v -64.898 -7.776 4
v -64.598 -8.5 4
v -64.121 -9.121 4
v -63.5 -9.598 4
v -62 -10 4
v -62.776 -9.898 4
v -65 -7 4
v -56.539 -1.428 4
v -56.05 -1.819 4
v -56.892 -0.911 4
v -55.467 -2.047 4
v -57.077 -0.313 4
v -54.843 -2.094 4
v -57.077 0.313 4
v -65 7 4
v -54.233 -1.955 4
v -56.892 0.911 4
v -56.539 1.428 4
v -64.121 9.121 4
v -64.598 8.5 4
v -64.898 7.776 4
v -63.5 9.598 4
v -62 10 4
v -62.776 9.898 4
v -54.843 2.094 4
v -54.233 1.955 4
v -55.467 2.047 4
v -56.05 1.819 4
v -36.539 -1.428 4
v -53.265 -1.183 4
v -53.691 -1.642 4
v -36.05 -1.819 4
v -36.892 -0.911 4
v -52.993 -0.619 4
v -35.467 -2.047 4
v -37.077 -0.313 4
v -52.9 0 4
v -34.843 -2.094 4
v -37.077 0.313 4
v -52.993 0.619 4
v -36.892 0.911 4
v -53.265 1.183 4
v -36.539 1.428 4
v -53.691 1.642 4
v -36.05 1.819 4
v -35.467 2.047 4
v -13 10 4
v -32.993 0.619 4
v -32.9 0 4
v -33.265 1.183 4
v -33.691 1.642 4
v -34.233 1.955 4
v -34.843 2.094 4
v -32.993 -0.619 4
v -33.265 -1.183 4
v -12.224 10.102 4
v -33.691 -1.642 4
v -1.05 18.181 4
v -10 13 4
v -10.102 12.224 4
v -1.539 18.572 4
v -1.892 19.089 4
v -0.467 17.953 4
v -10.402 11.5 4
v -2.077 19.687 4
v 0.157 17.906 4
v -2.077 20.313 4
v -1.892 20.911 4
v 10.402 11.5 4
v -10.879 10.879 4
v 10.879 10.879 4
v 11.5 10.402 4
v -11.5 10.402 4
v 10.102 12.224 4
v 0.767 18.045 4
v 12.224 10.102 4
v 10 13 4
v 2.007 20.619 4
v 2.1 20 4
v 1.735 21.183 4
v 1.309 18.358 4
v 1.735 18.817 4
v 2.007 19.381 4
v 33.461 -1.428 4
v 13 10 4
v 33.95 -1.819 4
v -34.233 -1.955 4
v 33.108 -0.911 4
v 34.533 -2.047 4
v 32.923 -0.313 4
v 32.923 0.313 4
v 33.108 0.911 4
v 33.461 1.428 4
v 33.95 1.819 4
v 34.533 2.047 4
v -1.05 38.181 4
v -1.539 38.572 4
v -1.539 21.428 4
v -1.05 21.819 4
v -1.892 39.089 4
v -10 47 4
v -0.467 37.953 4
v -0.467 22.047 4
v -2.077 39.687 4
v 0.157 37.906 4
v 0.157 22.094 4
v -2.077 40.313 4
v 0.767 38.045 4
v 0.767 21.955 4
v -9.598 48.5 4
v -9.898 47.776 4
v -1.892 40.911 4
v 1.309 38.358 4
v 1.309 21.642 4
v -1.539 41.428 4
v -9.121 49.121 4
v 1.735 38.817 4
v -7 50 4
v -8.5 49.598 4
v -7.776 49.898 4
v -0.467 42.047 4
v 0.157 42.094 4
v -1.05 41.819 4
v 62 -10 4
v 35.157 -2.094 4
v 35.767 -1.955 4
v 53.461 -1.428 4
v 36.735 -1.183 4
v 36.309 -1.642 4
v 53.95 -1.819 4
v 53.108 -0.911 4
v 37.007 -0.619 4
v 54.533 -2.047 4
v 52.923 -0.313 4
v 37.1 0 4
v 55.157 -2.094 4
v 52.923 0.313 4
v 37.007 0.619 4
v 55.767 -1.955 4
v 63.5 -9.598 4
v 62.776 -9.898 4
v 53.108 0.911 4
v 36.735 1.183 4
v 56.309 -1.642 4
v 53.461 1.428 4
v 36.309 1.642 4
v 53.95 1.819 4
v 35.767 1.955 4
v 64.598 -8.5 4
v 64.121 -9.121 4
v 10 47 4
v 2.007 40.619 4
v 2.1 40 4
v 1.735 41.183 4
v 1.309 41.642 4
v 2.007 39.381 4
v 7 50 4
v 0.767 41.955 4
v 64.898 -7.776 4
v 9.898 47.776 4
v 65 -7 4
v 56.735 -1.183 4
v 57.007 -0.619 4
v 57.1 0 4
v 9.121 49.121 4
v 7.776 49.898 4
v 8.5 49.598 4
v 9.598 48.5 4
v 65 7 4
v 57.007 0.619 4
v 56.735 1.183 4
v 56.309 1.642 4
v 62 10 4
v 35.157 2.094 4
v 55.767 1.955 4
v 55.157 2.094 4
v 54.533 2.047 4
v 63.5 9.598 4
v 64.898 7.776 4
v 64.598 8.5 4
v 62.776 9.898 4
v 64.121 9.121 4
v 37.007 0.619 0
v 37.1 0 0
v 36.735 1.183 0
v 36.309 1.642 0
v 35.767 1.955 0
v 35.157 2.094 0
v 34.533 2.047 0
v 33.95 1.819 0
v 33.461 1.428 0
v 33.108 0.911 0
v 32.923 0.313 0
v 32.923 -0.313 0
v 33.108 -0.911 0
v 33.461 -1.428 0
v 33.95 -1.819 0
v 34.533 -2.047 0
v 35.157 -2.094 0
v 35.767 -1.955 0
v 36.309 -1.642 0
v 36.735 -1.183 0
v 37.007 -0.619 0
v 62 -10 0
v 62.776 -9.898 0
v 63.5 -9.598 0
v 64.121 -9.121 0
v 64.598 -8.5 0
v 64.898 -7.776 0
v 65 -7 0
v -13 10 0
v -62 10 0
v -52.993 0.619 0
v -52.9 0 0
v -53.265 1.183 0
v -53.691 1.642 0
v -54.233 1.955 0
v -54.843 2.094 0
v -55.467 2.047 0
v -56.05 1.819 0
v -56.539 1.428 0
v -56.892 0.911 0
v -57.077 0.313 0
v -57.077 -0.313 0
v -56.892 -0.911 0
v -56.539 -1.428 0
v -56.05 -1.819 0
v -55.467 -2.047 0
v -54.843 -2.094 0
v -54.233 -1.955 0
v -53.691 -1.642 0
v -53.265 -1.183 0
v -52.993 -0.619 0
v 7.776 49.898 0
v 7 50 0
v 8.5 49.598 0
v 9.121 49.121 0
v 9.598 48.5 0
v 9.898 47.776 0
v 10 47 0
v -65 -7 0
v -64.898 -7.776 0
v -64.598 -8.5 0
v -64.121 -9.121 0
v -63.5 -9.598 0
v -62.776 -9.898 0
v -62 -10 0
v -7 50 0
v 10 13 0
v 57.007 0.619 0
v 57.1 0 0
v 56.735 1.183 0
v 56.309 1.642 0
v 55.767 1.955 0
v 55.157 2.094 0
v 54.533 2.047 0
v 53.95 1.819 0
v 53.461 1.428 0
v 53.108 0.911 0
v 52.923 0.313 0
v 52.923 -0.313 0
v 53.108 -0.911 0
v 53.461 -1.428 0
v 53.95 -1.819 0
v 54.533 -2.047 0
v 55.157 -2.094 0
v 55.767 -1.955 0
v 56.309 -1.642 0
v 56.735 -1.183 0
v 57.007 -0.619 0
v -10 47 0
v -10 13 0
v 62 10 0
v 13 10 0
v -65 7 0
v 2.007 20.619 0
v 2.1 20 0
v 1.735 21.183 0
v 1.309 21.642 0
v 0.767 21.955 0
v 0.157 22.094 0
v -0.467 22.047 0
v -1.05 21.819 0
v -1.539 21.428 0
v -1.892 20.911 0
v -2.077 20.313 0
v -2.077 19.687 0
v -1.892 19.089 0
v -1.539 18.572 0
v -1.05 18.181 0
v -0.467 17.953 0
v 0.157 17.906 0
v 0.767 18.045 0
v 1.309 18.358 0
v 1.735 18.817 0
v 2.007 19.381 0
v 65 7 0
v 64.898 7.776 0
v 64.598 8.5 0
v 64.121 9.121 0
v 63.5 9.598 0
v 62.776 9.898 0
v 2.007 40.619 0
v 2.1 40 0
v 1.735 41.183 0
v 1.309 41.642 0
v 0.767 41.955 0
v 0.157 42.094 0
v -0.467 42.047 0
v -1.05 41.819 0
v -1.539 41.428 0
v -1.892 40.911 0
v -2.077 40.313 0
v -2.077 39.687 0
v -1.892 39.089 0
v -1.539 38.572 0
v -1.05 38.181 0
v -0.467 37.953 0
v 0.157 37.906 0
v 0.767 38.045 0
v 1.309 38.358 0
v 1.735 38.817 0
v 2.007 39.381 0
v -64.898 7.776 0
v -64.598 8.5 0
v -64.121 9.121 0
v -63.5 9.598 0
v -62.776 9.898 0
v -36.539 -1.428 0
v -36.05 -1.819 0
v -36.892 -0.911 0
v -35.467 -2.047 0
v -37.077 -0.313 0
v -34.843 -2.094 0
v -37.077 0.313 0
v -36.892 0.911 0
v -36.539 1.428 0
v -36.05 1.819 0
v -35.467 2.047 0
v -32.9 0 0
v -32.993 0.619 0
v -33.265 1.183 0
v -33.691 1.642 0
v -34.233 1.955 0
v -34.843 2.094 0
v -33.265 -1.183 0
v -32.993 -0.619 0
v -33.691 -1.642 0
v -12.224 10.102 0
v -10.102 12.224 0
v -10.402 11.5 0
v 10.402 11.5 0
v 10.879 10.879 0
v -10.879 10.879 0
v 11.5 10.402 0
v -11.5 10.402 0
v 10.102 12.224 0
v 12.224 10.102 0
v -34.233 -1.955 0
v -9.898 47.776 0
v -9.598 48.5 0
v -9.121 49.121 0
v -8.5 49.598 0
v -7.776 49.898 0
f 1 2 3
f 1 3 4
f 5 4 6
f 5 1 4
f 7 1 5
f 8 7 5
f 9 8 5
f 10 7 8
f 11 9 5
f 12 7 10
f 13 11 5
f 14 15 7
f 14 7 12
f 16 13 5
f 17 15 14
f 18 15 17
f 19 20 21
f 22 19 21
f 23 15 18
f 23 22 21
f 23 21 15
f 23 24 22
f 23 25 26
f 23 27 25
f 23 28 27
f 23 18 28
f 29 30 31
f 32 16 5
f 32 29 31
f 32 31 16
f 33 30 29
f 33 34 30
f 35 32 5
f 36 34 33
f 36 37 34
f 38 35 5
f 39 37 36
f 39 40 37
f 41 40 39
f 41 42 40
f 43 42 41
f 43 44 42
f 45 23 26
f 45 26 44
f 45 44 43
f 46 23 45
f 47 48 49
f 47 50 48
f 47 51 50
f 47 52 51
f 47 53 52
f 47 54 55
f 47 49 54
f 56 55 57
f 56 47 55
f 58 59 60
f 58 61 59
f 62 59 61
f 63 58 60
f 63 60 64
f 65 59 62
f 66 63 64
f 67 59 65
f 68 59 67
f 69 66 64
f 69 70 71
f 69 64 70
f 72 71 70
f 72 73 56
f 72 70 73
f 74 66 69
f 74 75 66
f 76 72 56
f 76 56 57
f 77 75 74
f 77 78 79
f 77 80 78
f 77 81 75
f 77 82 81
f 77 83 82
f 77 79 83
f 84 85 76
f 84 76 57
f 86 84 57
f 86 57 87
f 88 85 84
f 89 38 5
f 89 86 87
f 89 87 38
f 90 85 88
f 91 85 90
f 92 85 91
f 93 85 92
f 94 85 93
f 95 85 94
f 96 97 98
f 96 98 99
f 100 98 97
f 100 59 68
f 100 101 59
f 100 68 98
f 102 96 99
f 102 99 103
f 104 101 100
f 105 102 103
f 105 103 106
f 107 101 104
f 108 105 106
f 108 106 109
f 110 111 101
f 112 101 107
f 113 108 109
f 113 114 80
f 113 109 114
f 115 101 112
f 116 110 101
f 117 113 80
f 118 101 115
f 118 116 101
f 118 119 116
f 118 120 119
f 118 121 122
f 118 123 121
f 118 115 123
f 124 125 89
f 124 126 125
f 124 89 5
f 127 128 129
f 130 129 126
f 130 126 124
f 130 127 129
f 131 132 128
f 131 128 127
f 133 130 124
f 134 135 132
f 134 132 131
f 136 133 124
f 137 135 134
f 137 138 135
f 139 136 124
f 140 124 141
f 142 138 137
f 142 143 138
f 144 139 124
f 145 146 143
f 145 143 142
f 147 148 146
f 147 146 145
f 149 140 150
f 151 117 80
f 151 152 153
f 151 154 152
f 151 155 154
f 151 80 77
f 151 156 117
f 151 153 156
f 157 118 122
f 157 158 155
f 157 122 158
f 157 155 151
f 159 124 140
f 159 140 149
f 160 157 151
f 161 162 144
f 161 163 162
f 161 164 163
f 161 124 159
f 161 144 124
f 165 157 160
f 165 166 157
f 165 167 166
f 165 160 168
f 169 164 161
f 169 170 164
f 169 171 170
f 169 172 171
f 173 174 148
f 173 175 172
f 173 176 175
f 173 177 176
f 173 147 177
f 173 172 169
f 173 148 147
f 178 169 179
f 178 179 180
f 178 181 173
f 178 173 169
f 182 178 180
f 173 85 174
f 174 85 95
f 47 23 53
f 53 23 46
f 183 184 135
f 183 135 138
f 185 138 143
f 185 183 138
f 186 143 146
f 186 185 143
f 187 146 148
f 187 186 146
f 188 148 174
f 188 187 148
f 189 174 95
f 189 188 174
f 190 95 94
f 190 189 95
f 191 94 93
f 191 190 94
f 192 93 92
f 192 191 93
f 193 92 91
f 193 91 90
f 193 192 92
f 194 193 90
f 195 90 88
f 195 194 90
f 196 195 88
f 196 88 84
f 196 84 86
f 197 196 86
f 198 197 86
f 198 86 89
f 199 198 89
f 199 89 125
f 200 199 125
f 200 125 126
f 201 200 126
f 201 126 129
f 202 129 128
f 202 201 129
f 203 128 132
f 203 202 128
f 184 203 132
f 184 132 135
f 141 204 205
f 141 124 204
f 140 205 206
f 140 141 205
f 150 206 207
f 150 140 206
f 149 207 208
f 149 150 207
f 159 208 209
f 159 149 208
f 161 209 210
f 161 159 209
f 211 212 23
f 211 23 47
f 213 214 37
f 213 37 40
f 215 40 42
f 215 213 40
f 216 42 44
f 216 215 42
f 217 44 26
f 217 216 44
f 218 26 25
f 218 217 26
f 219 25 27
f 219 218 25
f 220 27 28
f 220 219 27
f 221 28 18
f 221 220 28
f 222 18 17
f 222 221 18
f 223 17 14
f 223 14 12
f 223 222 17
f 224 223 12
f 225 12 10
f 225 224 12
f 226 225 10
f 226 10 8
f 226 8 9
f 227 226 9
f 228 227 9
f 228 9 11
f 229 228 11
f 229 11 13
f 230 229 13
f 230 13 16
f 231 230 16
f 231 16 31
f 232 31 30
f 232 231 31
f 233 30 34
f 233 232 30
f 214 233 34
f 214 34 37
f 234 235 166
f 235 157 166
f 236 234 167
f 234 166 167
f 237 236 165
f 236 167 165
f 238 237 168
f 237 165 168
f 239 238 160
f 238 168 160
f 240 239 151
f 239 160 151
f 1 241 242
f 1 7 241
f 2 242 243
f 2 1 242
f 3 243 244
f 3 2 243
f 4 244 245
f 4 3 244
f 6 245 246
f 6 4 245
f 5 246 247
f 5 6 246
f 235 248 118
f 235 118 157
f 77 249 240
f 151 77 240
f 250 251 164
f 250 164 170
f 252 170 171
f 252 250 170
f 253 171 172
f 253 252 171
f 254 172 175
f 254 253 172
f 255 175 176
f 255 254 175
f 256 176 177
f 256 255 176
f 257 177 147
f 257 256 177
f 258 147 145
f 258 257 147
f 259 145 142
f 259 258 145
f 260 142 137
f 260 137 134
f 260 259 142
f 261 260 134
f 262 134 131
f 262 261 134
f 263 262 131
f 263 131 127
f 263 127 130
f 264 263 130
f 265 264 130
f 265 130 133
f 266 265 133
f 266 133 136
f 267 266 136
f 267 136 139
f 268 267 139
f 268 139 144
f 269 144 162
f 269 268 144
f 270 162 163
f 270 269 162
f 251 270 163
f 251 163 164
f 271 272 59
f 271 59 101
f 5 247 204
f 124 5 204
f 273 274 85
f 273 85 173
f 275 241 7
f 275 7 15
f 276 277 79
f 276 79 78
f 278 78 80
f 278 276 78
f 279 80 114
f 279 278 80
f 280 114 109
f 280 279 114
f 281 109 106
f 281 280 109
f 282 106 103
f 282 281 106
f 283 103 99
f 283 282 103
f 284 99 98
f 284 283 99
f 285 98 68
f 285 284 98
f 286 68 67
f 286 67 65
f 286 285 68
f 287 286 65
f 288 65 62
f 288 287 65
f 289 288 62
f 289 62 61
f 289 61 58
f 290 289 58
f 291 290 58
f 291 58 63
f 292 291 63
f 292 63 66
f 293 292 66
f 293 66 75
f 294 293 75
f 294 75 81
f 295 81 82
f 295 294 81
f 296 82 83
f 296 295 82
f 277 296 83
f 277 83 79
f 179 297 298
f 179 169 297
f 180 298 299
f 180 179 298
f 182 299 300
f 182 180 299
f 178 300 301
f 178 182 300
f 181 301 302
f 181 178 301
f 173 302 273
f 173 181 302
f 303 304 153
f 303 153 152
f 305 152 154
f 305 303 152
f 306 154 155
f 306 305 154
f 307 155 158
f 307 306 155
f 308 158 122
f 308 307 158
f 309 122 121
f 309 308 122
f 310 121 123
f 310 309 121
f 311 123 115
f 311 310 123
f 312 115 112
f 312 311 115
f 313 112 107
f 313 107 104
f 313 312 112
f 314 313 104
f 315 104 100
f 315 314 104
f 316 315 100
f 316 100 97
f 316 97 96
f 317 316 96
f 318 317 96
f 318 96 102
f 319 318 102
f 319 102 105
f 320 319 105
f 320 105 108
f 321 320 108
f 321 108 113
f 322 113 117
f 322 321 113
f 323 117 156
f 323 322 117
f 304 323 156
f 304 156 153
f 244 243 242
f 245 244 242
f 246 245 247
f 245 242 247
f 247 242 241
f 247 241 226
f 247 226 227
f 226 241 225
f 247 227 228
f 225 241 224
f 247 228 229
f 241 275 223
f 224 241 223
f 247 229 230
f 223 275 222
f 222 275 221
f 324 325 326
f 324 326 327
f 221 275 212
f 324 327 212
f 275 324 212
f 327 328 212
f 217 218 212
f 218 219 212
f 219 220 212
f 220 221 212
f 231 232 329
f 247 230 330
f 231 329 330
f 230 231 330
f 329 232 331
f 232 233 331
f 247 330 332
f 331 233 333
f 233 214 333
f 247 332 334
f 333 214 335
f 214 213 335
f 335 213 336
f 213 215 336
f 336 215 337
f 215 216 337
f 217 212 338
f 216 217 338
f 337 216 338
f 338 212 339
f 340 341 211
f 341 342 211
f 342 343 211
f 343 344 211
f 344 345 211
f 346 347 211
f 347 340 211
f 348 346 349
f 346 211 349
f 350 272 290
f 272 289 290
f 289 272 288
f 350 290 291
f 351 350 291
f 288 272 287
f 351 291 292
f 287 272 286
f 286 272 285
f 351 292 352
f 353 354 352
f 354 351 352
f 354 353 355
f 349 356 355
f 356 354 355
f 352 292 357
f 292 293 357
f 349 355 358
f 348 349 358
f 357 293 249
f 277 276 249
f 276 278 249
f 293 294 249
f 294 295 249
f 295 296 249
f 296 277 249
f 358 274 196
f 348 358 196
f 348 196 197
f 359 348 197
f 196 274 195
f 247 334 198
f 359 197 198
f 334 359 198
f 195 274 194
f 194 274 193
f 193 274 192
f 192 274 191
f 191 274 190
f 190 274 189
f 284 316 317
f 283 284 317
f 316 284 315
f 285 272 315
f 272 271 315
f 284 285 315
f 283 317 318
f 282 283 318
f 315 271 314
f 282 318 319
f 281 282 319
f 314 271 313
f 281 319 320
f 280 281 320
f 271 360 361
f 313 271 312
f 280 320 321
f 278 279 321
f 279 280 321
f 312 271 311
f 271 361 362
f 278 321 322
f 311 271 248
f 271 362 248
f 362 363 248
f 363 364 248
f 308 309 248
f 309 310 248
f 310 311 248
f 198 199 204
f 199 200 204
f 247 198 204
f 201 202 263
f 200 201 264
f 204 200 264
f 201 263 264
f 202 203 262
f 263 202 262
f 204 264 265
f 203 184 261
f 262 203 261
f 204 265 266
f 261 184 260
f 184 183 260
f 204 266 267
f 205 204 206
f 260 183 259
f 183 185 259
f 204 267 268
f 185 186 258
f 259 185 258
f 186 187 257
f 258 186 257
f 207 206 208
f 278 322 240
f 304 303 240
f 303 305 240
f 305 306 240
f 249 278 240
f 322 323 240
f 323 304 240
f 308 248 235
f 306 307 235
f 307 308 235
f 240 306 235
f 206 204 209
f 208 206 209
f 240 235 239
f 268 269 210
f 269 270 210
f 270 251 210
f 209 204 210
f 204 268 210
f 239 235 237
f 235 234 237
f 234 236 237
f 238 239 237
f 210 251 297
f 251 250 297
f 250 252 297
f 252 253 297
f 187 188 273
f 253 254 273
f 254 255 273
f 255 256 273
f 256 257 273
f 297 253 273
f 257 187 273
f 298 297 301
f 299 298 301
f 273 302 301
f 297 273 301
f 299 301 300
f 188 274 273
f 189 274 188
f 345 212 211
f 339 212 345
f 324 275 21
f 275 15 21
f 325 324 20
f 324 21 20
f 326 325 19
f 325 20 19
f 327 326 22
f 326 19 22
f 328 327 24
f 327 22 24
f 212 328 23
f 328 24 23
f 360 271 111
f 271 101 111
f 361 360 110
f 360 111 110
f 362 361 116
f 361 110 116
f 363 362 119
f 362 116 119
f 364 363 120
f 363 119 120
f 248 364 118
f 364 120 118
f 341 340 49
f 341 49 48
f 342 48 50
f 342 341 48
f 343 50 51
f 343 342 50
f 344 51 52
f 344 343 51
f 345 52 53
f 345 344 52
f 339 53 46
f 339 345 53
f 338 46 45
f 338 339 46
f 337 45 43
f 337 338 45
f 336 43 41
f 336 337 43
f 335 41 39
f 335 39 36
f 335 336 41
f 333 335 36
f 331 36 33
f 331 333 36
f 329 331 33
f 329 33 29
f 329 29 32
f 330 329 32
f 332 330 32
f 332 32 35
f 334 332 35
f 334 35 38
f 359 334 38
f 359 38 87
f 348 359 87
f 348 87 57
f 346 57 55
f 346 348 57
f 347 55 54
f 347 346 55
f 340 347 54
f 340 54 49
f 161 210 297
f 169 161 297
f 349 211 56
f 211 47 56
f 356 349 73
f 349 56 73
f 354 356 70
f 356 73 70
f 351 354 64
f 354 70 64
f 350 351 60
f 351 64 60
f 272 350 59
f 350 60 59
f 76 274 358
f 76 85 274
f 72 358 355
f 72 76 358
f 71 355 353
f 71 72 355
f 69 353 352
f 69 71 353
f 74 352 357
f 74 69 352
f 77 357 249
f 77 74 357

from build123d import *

# Parameters (mm, degrees)
SKETCH_1_W      = 130
SKETCH_1_H      = 20
SKETCH_1_R      = 2.1
SKETCH_1_W_2    = 20
SKETCH_1_H_2    = 40
EXTRUDE_1_DEPTH = 4
FILLET_1_R      = 3


with BuildPart() as part:
    # 草图1 → 凸台-拉伸1 (new body)
    # profile 1 of 2: a face of its own
    with BuildSketch(Plane.XY):
        Rectangle(SKETCH_1_W, SKETCH_1_H)
        with Locations((35, 0)):
            Circle(SKETCH_1_R, mode=Mode.SUBTRACT)
        with Locations((-35, 0)):
            Circle(SKETCH_1_R, mode=Mode.SUBTRACT)
        with Locations((-55, 0)):
            Circle(SKETCH_1_R, mode=Mode.SUBTRACT)
        with Locations((55, 0)):
            Circle(SKETCH_1_R, mode=Mode.SUBTRACT)
    # profile 2 of 2: a face of its own
    with BuildSketch(Plane.XY):
        with Locations((0, 30)):
            Rectangle(SKETCH_1_W_2, SKETCH_1_H_2)
        with Locations((0, 20)):
            Circle(SKETCH_1_R, mode=Mode.SUBTRACT)
        with Locations((0, 40)):
            Circle(SKETCH_1_R, mode=Mode.SUBTRACT)
    extrude(amount=EXTRUDE_1_DEPTH)

    # 圆角1
    fillet_1_edges = [part.edges().sort_by_distance(p)[0] for p in [
        (65, -10, 2),
        (-65, -10, 2),
        (-65, 10, 2),
        (-10, 10, 2),
        (-10, 50, 2),
        (10, 50, 2),
        (10, 10, 2),
        (65, 10, 2),
    ]]
    fillet(fillet_1_edges, radius=FILLET_1_R)


solid = part.part
